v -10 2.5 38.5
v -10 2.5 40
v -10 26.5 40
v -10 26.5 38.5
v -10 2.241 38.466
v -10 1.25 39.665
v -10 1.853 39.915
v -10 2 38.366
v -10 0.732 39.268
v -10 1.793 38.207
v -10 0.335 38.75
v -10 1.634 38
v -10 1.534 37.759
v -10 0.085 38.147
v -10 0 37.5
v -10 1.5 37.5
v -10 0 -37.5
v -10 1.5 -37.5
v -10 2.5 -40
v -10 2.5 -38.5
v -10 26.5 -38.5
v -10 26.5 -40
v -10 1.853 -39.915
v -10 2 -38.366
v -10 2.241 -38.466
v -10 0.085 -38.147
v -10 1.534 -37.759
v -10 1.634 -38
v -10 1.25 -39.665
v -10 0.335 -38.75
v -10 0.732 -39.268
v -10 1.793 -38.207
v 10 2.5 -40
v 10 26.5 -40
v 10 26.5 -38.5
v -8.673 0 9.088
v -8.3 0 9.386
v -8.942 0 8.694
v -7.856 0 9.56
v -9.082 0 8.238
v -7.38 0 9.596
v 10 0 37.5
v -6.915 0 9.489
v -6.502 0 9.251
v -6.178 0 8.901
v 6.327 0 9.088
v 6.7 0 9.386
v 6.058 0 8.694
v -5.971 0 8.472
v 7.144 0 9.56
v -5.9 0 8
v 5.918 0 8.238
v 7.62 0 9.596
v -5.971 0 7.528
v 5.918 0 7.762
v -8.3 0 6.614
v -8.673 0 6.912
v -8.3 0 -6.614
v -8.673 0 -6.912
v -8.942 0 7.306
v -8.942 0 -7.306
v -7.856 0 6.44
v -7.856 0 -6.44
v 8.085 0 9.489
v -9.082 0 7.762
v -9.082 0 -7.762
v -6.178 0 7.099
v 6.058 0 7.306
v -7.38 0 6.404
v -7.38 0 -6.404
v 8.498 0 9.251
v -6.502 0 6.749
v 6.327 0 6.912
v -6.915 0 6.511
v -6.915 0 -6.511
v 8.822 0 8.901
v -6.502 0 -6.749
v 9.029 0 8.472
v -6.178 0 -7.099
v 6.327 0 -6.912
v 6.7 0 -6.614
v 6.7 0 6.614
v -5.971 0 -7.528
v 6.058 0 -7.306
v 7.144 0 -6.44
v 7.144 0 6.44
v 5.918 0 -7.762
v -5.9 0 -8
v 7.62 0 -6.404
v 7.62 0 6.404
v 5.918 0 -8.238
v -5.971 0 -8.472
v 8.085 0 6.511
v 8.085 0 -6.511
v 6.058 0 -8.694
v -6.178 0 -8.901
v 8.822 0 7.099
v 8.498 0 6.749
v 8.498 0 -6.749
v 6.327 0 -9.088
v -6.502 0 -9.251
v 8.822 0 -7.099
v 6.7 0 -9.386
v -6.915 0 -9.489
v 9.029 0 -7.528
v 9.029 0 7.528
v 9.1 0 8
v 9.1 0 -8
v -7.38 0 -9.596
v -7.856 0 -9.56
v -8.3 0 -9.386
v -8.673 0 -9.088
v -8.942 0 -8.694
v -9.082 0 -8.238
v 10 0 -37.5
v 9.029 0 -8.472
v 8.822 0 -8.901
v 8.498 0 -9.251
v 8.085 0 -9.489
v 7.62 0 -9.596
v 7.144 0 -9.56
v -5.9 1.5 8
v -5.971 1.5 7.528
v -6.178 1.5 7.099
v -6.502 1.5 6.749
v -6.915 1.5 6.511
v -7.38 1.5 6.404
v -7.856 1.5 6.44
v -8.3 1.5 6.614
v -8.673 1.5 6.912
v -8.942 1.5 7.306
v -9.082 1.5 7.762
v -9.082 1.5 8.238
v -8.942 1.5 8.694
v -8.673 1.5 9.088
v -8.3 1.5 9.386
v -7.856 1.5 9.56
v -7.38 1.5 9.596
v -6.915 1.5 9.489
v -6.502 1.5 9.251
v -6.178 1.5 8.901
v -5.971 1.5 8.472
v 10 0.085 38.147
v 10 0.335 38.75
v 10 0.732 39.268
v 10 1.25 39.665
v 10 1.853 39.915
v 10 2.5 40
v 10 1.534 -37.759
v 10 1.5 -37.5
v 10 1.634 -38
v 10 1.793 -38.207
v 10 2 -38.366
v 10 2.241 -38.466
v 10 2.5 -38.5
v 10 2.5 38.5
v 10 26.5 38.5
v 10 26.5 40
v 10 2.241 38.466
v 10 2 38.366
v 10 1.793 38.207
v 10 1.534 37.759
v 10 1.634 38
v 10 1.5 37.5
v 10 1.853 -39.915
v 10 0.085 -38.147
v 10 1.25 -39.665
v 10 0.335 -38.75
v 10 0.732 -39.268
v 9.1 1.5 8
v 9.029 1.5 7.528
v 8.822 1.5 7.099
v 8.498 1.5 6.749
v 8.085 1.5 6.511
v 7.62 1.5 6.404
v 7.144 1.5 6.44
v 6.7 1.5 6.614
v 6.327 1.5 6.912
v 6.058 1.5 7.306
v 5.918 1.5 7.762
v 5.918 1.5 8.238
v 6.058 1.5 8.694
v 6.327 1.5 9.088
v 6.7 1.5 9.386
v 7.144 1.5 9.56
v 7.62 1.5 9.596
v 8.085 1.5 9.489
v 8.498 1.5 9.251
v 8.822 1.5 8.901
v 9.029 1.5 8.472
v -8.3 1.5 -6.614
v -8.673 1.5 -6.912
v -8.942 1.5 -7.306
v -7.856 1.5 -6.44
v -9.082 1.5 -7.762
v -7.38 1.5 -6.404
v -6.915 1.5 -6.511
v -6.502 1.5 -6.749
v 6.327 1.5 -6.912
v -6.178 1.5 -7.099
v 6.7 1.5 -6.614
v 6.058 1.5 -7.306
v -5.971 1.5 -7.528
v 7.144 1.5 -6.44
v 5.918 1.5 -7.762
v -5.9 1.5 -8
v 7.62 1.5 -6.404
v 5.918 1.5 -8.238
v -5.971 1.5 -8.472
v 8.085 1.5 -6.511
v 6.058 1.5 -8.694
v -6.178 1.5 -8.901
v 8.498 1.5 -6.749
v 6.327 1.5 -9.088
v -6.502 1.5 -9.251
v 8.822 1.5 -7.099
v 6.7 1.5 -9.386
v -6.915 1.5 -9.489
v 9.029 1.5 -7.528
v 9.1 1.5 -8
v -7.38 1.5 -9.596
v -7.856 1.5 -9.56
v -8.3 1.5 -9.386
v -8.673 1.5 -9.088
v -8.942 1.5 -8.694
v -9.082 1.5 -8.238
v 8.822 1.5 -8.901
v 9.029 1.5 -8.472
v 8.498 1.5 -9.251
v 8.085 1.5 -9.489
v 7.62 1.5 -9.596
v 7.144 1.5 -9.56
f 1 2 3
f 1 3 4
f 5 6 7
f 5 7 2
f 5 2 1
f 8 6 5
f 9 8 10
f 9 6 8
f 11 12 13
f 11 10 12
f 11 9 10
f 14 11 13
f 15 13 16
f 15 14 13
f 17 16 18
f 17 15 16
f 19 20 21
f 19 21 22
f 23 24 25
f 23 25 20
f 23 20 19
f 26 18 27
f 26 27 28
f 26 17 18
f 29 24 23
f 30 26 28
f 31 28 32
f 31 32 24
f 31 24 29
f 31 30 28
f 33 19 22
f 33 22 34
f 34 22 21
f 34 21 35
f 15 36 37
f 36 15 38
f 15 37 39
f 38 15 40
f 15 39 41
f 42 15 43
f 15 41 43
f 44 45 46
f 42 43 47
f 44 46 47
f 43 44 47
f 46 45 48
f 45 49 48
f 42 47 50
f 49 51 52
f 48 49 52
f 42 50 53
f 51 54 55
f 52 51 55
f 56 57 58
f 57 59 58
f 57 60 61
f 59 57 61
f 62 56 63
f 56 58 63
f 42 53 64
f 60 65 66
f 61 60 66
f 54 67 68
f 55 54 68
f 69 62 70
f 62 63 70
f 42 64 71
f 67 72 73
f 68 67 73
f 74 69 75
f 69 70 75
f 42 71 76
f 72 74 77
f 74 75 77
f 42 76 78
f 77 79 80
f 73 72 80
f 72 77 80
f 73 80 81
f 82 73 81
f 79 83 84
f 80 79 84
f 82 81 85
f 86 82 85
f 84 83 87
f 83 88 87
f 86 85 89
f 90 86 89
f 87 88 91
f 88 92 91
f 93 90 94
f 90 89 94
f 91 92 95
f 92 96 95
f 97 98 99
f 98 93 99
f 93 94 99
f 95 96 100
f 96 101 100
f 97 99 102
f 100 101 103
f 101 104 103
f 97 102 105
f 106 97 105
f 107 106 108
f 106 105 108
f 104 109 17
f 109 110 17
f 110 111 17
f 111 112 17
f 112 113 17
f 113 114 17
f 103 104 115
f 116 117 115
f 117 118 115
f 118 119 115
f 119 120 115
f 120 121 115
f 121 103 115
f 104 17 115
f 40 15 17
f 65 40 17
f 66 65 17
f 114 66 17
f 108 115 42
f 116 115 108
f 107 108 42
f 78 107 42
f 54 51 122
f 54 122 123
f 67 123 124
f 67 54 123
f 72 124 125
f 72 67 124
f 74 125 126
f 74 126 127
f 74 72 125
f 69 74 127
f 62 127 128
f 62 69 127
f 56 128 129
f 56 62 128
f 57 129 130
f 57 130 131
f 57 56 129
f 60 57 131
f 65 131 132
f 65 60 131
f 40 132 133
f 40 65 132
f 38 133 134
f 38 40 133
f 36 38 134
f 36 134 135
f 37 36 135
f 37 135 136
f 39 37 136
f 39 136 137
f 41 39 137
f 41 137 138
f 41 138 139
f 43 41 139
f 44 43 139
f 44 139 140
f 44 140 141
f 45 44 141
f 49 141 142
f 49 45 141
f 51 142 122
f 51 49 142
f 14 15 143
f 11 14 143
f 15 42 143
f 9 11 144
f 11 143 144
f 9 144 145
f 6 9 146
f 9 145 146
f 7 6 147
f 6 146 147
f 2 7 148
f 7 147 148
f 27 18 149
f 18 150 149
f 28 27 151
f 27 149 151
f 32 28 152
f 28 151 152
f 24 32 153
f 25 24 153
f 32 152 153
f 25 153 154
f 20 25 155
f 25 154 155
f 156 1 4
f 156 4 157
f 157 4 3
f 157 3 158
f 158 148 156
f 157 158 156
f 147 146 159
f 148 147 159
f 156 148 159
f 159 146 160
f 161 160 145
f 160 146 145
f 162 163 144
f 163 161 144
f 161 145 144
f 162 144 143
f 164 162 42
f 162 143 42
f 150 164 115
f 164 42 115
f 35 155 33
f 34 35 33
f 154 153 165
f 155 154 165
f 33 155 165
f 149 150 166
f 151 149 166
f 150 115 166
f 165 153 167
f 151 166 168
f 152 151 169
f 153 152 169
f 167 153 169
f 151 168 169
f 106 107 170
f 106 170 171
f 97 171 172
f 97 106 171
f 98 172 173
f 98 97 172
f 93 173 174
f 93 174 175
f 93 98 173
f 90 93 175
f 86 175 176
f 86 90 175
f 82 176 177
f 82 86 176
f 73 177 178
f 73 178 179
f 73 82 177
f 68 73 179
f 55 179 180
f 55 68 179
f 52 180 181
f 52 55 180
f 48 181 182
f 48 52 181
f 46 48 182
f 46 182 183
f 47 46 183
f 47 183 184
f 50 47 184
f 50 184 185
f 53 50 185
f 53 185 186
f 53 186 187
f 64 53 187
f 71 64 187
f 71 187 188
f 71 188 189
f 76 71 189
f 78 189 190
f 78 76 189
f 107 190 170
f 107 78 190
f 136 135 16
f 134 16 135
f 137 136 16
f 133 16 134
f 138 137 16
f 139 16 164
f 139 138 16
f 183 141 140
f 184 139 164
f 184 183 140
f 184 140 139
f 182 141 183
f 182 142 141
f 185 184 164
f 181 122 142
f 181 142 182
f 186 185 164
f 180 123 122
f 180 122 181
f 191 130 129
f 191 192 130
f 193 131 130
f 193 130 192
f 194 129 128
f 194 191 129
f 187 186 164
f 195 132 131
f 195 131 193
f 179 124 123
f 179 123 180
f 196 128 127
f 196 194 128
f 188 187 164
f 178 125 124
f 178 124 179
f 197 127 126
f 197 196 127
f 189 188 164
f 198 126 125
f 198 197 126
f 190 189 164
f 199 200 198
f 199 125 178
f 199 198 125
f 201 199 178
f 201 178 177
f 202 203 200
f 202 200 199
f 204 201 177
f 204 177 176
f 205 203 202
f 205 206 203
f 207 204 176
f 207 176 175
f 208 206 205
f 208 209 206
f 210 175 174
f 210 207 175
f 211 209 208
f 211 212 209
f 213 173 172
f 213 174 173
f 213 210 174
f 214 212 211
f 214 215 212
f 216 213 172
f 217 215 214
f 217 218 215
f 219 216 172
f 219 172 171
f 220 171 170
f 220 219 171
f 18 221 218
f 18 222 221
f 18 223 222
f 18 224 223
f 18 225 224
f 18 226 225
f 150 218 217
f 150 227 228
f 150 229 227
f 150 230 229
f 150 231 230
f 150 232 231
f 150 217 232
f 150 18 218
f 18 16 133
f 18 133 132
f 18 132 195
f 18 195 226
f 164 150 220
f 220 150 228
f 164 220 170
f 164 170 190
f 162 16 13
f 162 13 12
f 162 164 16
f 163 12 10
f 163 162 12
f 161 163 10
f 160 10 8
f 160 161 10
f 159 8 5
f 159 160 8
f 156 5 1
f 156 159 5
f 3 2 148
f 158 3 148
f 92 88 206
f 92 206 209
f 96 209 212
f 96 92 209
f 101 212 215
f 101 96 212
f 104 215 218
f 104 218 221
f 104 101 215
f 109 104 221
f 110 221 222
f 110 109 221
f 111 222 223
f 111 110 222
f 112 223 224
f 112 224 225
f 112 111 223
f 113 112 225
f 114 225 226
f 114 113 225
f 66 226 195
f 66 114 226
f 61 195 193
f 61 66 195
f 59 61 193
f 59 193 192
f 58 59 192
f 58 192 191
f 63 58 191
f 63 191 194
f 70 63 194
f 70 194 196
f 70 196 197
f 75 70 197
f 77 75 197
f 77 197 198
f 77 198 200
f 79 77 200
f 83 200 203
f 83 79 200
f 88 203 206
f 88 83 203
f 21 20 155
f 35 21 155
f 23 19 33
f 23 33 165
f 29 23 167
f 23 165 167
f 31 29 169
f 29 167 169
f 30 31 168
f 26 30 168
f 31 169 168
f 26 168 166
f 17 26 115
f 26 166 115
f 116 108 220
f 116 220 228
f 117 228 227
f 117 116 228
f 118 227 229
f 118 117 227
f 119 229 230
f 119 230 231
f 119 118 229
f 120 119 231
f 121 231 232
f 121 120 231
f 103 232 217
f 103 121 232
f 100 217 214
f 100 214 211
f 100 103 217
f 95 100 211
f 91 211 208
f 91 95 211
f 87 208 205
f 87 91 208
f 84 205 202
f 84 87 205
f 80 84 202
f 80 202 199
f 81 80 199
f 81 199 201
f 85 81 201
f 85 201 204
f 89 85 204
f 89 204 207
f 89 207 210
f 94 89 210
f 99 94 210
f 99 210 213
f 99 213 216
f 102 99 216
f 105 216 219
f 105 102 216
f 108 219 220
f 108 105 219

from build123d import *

# Parameters (mm, degrees)
SKETCH2_W           = 20
SKETCH2_H           = 80
SKETCH2_R           = 1.6
BOSS_EXTRUDE1_DEPTH = 1.5
SKETCH3_W           = 20
SKETCH3_H           = 1.5
BOSS_EXTRUDE2_DEPTH = 25
FILLET1_R           = 1
FILLET2_R           = 2.5


with BuildPart() as part:
    # Sketch2 → Boss-Extrude1 (new body)
    with BuildSketch(Plane(origin=(0, 0, 0), x_dir=(1, 0, 0), z_dir=(0, 1, 0))):
        Rectangle(SKETCH2_W, SKETCH2_H)
        with Locations((-7.5, 8)):
            Circle(SKETCH2_R, mode=Mode.SUBTRACT)
        with Locations((7.5, 8)):
            Circle(SKETCH2_R, mode=Mode.SUBTRACT)
        with Locations((-7.5, -8)):
            Circle(SKETCH2_R, mode=Mode.SUBTRACT)
        with Locations((7.5, -8)):
            Circle(SKETCH2_R, mode=Mode.SUBTRACT)
    extrude(amount=BOSS_EXTRUDE1_DEPTH)

    # Sketch3 → Boss-Extrude2 (add)
    with BuildSketch(Plane(origin=(0, 1.5, 0), x_dir=(1, 0, 0), z_dir=(0, 1, 0))):
        with Locations((0, 39.25)):
            Rectangle(SKETCH3_W, SKETCH3_H)
        with Locations((0, -39.25)):
            Rectangle(SKETCH3_W, SKETCH3_H)
    extrude(amount=BOSS_EXTRUDE2_DEPTH)

    # Fillet1
    fillet1_edges = [part.edges().sort_by_distance(p)[0] for p in [
        (0, 1.5, -38.5),
        (0, 1.5, 38.5),
    ]]
    fillet(fillet1_edges, radius=FILLET1_R)

    # Fillet2
    fillet2_edges = [part.edges().sort_by_distance(p)[0] for p in [
        (0, 0, 40),
        (0, 0, -40),
    ]]
    fillet(fillet2_edges, radius=FILLET2_R)


solid = part.part
